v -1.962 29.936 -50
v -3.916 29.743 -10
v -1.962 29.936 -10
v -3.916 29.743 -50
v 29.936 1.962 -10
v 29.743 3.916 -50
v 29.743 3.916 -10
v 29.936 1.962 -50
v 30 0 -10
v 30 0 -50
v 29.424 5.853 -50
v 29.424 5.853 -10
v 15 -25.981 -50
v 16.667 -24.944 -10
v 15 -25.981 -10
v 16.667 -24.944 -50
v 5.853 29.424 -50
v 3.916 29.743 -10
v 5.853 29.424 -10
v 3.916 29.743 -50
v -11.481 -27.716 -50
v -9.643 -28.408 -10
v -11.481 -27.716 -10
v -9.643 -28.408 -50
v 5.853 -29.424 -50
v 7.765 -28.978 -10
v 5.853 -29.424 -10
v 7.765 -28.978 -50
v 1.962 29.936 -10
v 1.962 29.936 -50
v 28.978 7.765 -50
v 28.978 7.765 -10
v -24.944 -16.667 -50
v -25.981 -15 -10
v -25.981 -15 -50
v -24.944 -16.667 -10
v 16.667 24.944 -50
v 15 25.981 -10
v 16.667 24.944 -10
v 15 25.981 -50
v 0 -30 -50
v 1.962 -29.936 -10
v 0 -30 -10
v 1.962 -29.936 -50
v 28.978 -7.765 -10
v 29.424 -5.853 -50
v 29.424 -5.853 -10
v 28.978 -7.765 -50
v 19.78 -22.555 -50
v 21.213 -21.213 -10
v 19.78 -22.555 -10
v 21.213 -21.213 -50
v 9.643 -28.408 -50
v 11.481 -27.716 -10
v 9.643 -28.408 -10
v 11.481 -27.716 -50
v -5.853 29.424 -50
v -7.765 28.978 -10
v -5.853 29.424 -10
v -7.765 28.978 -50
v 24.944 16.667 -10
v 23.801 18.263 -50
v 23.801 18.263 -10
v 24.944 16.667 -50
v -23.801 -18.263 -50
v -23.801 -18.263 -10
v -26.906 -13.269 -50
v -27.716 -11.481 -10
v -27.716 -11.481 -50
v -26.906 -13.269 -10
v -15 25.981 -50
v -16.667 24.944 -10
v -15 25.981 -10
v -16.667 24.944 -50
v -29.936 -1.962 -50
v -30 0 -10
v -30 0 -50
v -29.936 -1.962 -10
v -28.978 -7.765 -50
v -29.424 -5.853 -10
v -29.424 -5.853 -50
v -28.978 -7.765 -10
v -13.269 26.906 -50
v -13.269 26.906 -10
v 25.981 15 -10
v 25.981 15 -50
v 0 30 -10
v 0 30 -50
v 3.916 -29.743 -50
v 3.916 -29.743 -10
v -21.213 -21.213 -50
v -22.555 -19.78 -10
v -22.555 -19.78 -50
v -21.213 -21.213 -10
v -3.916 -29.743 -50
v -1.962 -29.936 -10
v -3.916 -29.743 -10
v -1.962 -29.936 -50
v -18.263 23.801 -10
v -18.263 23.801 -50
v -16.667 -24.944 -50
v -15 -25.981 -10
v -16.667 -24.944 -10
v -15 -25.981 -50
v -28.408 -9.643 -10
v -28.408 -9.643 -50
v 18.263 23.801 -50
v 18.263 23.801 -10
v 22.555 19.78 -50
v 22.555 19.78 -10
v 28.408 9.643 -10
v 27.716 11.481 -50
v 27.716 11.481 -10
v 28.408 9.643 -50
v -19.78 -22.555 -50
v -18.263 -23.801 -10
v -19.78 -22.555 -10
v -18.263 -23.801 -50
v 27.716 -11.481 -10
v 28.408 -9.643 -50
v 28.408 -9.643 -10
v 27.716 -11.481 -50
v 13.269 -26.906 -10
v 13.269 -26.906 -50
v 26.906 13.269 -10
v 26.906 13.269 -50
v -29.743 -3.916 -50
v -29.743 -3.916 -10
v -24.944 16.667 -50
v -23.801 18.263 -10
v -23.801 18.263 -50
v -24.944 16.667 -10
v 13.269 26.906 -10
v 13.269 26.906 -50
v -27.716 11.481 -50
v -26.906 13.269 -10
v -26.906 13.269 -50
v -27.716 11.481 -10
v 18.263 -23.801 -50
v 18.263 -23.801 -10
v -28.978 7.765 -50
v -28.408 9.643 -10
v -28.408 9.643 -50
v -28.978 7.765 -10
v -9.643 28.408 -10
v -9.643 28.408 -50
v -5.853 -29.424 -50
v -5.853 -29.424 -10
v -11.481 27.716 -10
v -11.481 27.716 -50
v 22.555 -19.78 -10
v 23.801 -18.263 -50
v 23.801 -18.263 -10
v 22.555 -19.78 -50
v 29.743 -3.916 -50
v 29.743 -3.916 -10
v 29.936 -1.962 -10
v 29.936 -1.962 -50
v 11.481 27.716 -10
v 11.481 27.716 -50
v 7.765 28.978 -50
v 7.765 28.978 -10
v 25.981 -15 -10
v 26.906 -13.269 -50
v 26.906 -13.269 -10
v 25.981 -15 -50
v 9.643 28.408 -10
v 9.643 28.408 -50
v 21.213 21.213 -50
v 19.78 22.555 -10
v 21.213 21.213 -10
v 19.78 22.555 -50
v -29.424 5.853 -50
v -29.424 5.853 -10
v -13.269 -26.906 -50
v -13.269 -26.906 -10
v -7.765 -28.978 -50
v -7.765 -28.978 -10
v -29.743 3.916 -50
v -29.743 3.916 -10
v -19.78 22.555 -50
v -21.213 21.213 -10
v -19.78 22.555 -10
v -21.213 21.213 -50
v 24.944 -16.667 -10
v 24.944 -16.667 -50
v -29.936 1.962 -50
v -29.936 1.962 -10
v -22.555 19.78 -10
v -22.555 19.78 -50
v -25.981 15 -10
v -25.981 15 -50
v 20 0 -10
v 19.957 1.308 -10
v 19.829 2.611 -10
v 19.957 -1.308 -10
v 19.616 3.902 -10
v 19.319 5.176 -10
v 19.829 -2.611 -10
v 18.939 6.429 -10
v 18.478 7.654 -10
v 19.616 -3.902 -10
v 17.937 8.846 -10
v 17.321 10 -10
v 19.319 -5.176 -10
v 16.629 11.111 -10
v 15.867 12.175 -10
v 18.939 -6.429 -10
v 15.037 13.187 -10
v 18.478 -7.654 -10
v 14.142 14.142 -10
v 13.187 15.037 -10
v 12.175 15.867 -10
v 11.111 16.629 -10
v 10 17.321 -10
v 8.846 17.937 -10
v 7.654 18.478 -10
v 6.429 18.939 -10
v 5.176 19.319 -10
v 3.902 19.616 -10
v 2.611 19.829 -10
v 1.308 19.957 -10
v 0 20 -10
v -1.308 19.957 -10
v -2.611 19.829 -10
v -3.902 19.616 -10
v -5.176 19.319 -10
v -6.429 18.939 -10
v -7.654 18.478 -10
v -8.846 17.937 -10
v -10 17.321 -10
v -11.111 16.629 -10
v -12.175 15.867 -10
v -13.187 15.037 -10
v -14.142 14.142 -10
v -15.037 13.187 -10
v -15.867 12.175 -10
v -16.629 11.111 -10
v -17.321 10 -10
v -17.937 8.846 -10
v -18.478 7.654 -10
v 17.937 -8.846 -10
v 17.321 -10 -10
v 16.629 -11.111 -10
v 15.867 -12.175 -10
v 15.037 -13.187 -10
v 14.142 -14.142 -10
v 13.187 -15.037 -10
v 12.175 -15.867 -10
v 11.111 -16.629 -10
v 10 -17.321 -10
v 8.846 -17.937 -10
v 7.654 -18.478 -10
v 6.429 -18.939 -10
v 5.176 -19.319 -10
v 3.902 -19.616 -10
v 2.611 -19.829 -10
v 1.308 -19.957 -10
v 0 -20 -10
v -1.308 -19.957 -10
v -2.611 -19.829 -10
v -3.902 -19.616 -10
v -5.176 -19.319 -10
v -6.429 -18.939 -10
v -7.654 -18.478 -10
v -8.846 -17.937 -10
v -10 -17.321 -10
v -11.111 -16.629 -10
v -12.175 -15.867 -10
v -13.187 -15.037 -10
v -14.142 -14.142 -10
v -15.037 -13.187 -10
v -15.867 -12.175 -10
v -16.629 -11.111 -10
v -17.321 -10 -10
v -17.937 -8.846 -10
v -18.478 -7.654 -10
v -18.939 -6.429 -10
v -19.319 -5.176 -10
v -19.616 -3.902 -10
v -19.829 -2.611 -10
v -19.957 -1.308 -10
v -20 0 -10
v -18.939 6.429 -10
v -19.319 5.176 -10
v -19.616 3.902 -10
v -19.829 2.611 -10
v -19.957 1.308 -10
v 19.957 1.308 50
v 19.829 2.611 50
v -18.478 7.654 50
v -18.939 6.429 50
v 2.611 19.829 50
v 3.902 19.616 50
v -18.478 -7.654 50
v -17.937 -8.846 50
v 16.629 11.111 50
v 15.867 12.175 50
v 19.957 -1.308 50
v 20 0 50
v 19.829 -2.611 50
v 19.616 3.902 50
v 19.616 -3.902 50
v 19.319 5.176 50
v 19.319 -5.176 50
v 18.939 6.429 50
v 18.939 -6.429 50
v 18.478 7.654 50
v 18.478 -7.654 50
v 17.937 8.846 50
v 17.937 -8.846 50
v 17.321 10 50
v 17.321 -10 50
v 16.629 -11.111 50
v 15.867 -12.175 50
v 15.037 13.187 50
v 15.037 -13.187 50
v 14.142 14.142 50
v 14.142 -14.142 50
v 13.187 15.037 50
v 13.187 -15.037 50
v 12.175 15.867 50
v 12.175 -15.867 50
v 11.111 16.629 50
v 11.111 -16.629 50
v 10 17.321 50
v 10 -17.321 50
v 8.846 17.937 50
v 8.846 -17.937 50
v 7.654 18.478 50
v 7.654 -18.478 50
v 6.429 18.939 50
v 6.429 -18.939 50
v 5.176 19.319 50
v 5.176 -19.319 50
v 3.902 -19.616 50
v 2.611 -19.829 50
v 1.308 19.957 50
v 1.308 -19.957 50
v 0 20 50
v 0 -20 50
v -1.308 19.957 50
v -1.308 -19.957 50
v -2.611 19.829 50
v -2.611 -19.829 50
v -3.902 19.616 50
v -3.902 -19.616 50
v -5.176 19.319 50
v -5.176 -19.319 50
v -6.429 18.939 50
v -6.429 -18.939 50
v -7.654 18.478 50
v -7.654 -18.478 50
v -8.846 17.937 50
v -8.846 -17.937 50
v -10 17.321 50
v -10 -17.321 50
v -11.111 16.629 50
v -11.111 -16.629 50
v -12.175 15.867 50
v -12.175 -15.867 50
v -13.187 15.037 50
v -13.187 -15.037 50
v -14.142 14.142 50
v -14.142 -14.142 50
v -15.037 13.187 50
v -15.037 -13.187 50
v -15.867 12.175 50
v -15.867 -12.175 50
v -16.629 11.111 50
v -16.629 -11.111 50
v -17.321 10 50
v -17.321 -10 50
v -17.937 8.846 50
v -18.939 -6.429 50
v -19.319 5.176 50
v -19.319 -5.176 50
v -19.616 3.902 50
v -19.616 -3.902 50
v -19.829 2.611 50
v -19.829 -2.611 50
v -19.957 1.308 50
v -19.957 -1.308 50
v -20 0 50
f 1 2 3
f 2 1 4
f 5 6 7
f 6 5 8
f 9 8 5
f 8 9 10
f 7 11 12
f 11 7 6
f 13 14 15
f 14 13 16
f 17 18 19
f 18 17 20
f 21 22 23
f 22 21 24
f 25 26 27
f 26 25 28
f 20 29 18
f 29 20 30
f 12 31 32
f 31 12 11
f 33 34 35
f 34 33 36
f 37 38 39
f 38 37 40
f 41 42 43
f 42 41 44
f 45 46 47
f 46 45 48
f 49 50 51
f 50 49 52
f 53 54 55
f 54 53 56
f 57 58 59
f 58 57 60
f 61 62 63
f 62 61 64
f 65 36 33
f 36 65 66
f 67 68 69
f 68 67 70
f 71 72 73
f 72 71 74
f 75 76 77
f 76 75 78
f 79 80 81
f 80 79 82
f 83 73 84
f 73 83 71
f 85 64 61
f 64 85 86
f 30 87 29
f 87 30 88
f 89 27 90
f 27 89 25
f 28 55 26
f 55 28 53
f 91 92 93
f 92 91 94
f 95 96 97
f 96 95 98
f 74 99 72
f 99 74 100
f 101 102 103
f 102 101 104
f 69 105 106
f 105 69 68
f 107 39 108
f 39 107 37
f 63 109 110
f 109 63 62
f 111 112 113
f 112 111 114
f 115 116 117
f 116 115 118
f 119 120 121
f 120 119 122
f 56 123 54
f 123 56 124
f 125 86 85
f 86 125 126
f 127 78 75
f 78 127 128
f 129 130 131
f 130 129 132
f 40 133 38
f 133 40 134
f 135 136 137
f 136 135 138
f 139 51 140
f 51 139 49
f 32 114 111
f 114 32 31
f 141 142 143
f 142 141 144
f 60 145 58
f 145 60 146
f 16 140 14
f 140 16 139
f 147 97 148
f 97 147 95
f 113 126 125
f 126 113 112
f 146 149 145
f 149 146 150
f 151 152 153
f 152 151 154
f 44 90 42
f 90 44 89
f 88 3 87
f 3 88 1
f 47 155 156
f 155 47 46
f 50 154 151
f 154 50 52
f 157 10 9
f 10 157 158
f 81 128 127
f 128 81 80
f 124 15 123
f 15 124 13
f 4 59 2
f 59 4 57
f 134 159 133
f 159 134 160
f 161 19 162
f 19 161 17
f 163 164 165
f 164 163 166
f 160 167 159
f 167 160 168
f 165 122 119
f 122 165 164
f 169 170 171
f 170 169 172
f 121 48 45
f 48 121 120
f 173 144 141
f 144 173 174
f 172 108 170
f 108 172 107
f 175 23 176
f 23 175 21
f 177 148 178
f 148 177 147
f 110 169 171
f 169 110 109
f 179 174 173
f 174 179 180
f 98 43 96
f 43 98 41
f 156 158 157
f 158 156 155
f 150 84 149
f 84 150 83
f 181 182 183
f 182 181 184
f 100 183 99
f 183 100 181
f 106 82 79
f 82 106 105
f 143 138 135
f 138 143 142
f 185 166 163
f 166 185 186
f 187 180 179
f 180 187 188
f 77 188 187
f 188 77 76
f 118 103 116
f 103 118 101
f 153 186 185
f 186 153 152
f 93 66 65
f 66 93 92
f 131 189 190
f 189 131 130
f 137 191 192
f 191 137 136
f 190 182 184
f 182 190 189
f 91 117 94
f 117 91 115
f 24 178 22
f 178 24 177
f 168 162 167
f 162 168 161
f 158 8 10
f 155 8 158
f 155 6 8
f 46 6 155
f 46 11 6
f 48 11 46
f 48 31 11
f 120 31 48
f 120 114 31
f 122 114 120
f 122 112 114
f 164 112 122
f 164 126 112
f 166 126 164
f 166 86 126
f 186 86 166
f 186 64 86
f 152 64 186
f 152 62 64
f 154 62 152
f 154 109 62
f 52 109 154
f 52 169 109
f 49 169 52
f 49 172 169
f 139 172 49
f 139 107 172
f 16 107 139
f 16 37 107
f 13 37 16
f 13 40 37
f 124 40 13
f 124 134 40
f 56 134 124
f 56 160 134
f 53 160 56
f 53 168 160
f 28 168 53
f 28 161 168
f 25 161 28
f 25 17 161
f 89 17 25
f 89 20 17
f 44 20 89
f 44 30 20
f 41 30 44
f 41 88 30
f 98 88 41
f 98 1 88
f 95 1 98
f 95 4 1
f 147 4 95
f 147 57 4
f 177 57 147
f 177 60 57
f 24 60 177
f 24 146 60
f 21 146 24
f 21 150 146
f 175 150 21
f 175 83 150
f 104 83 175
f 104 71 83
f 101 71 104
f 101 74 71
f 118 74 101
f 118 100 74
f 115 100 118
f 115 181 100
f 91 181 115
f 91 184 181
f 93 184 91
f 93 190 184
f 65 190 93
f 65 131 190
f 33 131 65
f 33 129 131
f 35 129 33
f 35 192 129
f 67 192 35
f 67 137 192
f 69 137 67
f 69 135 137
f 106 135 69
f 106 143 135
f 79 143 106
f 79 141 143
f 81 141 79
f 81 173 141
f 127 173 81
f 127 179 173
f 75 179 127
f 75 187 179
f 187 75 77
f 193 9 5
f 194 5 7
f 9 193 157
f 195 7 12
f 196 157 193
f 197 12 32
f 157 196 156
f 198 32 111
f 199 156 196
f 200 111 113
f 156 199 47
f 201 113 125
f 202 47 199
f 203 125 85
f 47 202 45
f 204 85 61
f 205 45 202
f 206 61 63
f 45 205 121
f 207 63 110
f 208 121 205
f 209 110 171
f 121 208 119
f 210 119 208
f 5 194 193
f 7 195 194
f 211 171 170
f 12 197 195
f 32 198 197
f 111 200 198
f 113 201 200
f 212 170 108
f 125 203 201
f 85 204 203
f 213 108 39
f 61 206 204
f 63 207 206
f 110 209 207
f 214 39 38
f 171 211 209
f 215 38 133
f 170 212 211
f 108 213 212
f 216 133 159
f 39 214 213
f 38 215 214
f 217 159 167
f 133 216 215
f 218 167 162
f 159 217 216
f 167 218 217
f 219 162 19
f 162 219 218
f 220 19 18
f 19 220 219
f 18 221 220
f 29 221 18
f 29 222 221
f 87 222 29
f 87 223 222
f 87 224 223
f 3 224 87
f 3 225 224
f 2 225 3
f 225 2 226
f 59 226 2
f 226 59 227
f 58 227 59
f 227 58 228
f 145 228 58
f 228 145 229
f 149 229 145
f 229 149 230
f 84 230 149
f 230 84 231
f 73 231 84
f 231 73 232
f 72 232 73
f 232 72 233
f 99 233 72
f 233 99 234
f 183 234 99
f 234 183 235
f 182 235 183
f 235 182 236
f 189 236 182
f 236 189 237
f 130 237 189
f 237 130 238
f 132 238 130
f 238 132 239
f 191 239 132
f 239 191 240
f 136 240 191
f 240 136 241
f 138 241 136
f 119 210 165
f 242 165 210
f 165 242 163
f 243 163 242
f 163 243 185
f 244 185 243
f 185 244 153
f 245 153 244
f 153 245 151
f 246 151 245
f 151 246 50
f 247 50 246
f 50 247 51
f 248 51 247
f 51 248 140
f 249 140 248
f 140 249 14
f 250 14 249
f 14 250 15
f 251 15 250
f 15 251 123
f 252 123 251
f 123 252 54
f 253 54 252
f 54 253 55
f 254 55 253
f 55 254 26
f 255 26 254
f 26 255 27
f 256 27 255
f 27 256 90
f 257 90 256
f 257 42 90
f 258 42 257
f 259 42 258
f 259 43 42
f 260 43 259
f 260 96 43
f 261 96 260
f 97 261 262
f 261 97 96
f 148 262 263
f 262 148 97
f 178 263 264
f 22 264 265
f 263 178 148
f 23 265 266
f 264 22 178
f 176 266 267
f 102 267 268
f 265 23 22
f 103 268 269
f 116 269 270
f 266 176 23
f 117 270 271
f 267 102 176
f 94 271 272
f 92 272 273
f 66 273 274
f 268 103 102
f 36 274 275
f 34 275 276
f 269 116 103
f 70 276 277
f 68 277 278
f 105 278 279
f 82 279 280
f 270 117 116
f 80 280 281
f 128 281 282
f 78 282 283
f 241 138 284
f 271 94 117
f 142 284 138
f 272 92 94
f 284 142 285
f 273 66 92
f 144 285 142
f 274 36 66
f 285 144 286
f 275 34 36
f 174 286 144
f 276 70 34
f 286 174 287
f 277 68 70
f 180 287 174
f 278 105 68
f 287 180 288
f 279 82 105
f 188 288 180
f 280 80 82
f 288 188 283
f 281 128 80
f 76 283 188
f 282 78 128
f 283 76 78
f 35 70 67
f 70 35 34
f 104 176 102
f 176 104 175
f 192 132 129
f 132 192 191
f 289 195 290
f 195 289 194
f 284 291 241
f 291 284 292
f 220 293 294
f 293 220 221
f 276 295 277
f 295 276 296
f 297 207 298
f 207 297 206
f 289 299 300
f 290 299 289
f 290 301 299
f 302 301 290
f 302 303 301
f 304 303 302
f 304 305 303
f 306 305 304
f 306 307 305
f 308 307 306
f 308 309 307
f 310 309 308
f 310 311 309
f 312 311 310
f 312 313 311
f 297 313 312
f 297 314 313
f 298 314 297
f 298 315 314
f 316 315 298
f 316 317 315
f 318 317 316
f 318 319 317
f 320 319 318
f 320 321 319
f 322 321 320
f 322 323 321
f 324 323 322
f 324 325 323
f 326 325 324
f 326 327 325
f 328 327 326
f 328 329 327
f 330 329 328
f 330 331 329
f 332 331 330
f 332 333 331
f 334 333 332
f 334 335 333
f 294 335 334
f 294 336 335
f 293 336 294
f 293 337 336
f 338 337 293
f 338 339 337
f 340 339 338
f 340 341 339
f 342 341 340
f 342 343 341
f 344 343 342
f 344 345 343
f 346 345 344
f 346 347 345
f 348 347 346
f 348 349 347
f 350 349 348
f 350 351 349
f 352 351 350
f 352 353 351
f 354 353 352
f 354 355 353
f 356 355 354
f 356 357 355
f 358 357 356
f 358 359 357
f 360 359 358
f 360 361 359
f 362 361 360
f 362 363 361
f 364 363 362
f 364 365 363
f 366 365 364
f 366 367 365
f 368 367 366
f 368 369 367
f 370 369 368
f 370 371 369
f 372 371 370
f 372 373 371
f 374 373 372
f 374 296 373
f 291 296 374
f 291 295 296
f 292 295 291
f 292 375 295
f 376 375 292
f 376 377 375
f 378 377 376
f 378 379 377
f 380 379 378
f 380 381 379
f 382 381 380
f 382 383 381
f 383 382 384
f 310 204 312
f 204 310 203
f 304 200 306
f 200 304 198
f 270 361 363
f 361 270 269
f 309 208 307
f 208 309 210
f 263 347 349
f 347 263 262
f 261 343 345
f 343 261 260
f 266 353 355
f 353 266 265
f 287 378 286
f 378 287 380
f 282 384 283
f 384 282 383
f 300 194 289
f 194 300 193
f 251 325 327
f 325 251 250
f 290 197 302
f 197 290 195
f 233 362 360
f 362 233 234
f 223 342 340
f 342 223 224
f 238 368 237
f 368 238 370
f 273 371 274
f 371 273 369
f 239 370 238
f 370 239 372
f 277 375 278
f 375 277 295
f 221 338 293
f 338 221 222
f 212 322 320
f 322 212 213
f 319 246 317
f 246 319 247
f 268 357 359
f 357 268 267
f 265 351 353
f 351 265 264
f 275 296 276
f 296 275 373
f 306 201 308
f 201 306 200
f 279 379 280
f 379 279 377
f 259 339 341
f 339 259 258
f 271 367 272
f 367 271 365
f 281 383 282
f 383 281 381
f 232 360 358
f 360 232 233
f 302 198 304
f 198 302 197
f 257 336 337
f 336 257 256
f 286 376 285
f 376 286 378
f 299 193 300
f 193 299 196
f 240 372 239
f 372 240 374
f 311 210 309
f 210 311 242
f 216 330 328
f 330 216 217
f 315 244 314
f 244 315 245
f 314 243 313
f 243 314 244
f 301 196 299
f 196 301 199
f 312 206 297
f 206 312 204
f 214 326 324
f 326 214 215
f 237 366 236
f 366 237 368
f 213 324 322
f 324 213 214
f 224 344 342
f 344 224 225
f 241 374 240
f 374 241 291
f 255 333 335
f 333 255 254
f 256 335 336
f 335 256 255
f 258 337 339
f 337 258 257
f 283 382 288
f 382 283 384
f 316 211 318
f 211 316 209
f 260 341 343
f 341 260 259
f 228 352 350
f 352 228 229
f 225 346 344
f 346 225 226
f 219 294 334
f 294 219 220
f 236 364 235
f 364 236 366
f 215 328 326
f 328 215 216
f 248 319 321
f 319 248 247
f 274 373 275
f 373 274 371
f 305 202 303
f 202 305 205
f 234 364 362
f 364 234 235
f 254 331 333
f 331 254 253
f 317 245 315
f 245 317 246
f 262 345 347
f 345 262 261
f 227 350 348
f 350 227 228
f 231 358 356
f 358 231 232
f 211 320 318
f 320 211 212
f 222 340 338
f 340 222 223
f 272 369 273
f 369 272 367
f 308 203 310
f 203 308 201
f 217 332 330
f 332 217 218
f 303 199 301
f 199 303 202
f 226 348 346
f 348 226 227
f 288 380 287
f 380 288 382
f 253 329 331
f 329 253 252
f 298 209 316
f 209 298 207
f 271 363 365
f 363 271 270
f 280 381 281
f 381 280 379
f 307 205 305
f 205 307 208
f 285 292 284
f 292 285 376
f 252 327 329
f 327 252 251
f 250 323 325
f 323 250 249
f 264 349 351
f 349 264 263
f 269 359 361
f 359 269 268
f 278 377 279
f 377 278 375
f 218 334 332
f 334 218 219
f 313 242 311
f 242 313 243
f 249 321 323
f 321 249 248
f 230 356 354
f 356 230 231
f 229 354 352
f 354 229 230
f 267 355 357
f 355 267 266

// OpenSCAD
radius1 = 30.0;
length1 = 40.0;
radius2 = 20.0;
length2 = 60.0;
total_len = length1 + length2;
union() {
  translate([0, 0, -30.0]) cylinder(r=radius1, h=length1, center=true, $fn=96);
  translate([0, 0, 20.0]) cylinder(r=radius2, h=length2, center=true, $fn=96);
}
